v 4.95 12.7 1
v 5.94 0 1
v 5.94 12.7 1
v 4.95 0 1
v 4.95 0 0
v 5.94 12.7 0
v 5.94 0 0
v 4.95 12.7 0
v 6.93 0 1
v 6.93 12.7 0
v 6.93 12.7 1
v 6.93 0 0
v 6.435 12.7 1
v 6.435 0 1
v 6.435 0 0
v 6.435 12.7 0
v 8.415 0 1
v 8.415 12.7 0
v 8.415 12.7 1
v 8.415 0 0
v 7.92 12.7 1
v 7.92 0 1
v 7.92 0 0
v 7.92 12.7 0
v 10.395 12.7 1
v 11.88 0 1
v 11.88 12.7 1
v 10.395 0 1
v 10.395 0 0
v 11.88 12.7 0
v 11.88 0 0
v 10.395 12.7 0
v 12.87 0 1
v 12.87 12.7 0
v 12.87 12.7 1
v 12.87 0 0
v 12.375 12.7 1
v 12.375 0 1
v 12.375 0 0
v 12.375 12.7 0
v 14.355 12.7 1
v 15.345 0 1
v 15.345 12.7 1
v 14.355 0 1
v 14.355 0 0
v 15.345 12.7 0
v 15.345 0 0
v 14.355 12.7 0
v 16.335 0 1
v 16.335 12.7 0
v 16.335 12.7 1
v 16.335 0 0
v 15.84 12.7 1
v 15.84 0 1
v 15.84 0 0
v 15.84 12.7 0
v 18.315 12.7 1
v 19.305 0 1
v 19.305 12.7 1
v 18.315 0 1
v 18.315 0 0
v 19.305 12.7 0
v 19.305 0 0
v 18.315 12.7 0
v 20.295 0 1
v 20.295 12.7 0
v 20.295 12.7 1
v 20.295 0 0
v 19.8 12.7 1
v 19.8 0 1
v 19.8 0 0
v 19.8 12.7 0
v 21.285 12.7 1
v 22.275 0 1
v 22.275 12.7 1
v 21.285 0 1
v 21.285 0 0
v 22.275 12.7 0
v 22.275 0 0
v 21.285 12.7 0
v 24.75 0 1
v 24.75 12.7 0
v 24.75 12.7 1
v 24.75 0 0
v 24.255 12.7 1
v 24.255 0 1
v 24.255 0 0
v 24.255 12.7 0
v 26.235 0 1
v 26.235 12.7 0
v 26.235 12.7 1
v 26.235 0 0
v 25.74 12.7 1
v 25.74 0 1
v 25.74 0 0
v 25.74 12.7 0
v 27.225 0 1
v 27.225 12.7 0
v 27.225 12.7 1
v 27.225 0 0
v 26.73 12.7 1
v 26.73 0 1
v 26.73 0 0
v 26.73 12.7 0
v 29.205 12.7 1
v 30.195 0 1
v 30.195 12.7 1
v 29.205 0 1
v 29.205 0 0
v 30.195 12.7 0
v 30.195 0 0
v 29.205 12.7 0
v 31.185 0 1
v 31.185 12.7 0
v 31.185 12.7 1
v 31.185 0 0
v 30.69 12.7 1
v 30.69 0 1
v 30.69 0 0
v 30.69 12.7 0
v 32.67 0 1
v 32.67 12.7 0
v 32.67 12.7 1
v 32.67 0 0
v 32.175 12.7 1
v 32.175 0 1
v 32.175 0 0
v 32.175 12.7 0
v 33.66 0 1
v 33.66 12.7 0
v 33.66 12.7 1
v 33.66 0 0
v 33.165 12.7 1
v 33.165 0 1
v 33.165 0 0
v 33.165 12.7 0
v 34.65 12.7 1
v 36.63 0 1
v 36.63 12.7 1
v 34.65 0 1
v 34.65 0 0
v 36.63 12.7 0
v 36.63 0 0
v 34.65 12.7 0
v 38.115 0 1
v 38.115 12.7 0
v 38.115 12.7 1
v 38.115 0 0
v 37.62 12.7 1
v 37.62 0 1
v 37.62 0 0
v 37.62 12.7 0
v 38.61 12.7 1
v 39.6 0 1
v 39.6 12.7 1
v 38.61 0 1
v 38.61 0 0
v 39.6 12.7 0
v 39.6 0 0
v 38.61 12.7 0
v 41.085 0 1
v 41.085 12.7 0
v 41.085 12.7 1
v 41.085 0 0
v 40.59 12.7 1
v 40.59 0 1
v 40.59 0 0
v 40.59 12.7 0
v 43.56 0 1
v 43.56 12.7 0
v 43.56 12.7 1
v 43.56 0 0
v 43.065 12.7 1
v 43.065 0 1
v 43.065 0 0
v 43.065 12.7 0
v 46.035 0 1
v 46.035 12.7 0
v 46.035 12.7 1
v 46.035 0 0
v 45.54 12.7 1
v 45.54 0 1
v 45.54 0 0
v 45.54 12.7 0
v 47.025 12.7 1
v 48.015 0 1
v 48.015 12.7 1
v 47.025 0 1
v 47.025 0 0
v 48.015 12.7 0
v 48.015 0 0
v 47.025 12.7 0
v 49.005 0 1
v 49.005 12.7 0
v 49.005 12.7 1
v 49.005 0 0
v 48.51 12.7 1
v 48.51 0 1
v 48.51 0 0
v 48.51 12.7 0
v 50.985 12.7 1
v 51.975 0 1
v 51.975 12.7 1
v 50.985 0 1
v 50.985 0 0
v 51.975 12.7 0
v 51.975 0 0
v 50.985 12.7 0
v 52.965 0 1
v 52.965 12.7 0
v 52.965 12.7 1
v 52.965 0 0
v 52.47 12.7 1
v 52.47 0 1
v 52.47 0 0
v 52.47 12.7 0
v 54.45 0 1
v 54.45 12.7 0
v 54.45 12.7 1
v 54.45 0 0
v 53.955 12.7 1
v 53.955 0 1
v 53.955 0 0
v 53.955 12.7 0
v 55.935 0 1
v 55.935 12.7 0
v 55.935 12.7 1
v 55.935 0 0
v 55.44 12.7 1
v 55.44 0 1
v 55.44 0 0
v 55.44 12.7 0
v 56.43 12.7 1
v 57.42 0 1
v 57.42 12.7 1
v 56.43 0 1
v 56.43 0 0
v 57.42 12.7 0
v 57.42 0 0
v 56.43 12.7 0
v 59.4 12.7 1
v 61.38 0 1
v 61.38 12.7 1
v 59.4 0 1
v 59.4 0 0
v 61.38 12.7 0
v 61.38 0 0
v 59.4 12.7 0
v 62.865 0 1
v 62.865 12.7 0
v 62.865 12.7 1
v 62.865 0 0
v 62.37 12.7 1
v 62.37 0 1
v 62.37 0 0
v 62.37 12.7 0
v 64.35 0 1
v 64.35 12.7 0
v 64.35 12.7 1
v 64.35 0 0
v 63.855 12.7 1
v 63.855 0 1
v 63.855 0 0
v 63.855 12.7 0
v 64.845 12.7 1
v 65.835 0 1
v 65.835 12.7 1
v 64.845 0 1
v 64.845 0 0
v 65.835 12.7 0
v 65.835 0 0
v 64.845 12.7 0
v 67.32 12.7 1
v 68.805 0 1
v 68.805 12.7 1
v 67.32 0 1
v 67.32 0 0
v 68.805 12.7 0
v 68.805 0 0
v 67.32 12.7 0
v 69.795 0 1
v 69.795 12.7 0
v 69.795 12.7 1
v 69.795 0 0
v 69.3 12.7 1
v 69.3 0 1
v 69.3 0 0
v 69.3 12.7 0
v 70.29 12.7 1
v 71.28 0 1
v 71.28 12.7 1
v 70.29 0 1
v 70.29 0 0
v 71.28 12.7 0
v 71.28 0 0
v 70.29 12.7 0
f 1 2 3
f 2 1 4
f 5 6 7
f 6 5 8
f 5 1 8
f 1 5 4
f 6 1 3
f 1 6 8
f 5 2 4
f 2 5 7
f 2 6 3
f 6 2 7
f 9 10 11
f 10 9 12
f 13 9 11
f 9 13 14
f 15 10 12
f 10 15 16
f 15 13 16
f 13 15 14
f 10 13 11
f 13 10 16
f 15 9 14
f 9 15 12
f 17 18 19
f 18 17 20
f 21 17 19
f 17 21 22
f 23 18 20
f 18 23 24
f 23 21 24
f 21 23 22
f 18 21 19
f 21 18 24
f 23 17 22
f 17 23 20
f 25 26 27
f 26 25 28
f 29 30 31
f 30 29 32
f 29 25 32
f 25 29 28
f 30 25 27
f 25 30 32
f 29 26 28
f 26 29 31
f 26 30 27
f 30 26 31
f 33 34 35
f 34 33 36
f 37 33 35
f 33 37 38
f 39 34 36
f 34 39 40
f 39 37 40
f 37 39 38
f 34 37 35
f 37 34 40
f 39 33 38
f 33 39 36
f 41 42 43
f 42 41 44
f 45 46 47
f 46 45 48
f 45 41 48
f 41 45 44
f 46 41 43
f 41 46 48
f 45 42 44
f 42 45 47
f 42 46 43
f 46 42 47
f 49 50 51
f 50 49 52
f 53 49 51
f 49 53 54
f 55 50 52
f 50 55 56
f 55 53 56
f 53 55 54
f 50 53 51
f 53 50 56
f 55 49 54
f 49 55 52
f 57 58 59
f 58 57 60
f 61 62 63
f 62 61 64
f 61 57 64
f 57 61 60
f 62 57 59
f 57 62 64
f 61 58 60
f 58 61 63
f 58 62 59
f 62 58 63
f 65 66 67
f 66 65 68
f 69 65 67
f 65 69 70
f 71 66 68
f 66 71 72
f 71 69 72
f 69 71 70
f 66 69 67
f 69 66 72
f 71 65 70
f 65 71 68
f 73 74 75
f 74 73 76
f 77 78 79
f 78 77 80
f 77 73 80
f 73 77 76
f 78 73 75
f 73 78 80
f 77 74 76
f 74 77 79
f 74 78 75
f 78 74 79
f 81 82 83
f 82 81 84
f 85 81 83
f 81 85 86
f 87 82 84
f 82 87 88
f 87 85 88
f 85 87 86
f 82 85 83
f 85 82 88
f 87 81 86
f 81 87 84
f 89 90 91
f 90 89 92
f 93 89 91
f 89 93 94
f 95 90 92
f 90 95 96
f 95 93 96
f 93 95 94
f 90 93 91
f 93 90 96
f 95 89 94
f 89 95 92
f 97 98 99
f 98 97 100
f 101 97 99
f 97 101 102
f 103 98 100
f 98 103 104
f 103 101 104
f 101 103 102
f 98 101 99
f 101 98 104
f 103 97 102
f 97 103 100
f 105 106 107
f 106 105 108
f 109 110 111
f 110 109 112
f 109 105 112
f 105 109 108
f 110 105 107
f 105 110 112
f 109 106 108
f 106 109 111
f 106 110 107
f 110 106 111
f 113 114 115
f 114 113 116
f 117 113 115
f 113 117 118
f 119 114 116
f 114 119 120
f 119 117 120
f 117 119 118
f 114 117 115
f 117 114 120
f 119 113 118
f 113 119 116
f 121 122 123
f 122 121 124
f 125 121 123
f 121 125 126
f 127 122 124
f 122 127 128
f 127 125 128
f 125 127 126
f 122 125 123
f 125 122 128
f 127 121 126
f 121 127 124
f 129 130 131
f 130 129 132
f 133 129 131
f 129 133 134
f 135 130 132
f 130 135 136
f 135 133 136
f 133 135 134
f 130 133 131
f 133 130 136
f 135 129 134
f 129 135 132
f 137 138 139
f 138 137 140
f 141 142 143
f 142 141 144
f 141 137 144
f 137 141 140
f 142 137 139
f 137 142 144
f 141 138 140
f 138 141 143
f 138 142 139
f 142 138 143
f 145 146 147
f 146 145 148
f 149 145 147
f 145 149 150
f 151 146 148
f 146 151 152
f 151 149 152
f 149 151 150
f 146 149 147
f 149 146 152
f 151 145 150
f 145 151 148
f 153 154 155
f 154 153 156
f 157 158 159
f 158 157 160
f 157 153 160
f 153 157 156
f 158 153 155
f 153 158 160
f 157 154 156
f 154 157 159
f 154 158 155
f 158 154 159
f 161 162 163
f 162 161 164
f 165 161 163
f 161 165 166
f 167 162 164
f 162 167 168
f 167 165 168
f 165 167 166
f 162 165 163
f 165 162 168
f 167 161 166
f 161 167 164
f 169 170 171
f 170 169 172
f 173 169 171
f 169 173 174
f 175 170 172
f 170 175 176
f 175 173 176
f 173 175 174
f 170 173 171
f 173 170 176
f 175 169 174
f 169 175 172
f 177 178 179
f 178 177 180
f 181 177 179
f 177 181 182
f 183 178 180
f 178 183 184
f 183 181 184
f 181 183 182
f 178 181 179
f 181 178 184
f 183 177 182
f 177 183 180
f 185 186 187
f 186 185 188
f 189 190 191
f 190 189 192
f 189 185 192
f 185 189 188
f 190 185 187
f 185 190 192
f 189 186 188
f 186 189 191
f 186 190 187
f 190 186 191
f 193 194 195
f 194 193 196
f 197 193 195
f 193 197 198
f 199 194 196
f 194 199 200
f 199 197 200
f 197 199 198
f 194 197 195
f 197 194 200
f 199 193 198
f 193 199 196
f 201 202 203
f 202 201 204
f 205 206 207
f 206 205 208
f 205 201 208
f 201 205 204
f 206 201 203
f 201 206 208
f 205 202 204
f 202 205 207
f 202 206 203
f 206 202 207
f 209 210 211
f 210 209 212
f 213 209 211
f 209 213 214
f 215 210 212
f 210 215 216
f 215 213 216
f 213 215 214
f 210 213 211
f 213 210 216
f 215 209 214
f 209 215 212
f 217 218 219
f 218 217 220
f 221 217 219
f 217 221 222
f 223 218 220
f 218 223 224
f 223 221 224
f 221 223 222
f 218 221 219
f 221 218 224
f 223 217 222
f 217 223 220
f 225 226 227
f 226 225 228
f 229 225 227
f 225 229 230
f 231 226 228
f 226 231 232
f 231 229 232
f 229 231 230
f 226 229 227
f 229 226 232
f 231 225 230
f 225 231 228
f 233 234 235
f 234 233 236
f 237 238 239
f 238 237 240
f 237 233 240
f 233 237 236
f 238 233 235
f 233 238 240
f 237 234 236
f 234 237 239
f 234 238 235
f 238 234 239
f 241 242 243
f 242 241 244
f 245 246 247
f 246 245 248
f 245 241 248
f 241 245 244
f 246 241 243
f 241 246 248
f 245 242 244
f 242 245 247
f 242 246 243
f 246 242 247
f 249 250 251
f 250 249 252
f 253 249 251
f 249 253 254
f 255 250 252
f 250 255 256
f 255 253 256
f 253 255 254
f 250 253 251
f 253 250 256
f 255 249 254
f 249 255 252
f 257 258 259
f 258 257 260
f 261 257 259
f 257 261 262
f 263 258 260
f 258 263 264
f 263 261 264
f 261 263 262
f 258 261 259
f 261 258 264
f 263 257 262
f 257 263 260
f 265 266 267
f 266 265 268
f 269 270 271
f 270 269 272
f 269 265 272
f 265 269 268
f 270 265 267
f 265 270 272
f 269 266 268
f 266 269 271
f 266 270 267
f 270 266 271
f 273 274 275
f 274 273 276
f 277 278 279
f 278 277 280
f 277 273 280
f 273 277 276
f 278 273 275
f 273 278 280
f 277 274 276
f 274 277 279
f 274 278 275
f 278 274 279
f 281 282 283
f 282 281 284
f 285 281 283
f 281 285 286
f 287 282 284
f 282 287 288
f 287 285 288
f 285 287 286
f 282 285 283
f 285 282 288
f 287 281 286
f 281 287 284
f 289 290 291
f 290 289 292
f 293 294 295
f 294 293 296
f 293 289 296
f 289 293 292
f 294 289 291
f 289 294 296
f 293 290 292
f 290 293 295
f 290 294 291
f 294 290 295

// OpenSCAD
// file: ../../util/bitmap.scad
/*****************************************************************************
 * Module Bitmap Library
 * Modules to create bitmaps of unit squares from 1 or 2 dimensional vectors.
 *****************************************************************************
 * Copyright 2017 Chris Baker
 *
 * This program is free software: you can redistribute it and/or modify
 * it under the terms of the GNU Lesser General Public License as published by
 * the Free Software Foundation, either version 3 of the License, or
 * (at your option) any later version.
 *
 * This program is distributed in the hope that it will be useful,
 * but WITHOUT ANY WARRANTY; without even the implied warranty of
 * MERCHANTABILITY or FITNESS FOR A PARTICULAR PURPOSE.  See the
 * GNU Lesser General Public License for more details.
 *
 * You should have received a copy of the GNU Lesser General Public License
 * along with this program.  If not, see <http://www.gnu.org/licenses/>.
 *****************************************************************************
 * Usage:
 * Include this file with the "use" tag.
 * Depends on compat.scad library.
 *
 * API:
 *   1dbitmap(bitmap, center, expansion, vector_mode)
 *   2dbitmap(bitmap, center, expansion, vector_mode)
 *     Generate a 1 or 2-Dimensional field of modules based on the provided
 *     bitmap vector. See Bitmap Vectors below.
 *     The center flag determines whether to center the bitmap on the origin.
 *     The expansion value actually shrinks each cube in the x and y
 *     dimension by the specified amount.
 *     The vector_mode flag determines whether to create 3D solid geometry
 *     (unit cubes) or 2D vector geometry (squares).
 *
 * Bitmap Vectors:
 *   The bitmap vectors primarily provide boolean information.
 *   A module will be placed where these vectors have a postive value and
 *   skipped where they have a negative value. I.E. 0, -1, false, and undef
 *   are all equivalent and result in a skip. 1 and true are equivalent and
 *   result in a placed 1-unit module.
 *   Further, if the value is an integer it will be treated as a height for
 *   the module, allowing z-maps to be created.
 *   If the value is not an integer or boolean, it will be treated as a color
 *   reference. This can be a string or RGBA vector that will be used to
 *   color the module in the OpenSCAD preview window.
 *   In current versions of OpenSCAD, the color has no effect in the rendered
 *   view or STL output.
 *
 * Vector Mode:
 *   Although OpenSCAD supports generating 2D geometry, there are several
 *   caveats:
 *   - 2D and 3D geometry cannot be mixed
 *   - Extruding 2D geometry causes color information to be lost
 *   - All 2D geometry is projected onto the XY plane when rendering
 *   - Rendering also results in loss of color (same as 3D)
 *   - The SVG exporter is somewhat limited:
 *     - The pixel size of the image is hard-coded in the file
 *     - The title of the image is a generic string
 *     - The color selection for stroke and fill is fixed
 *     - The stroke-width is set to a large value that will cause overlap
 *     - The background is transparent
 *     - Only one path element is created with all of the geometry; there is
 *       no easy way to split up the geometry into multiple logical units.
 *     - These issues can mostly be resolved by hand-editing the file:
 *       - Remove or modify the width and height parameters from the svg
 *         element at the top of the file to provide better scaling.
 *       - Edit the title element at the top of the file to change the title.
 *       - Edit the stroke and fill parameters of the path element (these will
 *         probably be at the end of the file).
 *       - Set the stroke-width parameter for the path element to 0.
 *****************************************************************************/
use <compat.scad>

/*
 * 2dbitmap - Turn a 2D vector into a bitmap of cubes
 *
 * bitmap - 2D vector representing where to place each cube
 *          Value can either be boolean, z-height, or color
 * center - center cubes around the origin
 * expansion - size of gap around each pixel (screendoor)
 * vector_mode - create a 2D vector drawing instead of 3D extrusion
 */
module 2dbitmap(bitmap=[[1,0],[0,1]], center=false, expansion=0, vector_mode=false)
{
	ylen=len(bitmap)-1;

	for (y=[0:ylen]) {
		xlen=len(bitmap[y])-1;
		for (x=[0:xlen])
			translate([x-(center?xlen/2:0),ylen-y-(center?ylen/2:0),0])
				if (is_indexable(bitmap[y][x]))
					color(bitmap[y][x])
						if (vector_mode)
							square([1-expansion,1-expansion], center=center);
						else
							cube([1-expansion,1-expansion,1], center=center);
				else
					if (bitmap[y][x])
						if (vector_mode)
							square([1-expansion,1-expansion], center=center);
						else
							cube([1-expansion,1-expansion,clamp_nonnum(bitmap[y][x])], center=center);
	}
}

module 1dbitmap(bitmap=[1,0,1,0,1], center=false, expansion=0, vector_mode=false)
	2dbitmap([bitmap], center, expansion, vector_mode);

/*
 * Examples
 */

// 1D with z-height
translate([10,0,0]) scale([1,10,1])
	1dbitmap(bitmap=[1,1,0,2,0,0,3], expansion=.1);

// 1D with boolean
translate([-20,0,0]) scale([1,10,1])
	1dbitmap(bitmap=[true,false,true,false,true,true]);

// 2D with z-height
scale([2,2,1])
	2dbitmap(bitmap=[[1,0,2,1],[0,3,3,0],[1,1,0,1]],
		center=true);

// 1D with color
translate([0,-10,0]) scale([1,3,1])
	1dbitmap(bitmap=["red","white","blue",[0,0.3,0,0.5]]);

// 1D with color using 2D-vector-mode
translate([-7,-8,0]) scale([1,2])
	1dbitmap(bitmap=["red",0,"blue",0,"green"], vector_mode=true);
translate([-4.5,-10,0]) scale([1,2])
	1dbitmap(bitmap=["red",0,"blue",0,"green"], vector_mode=true, center=true);
// main file
/* Unit Test 09: bar=[.2,.5,.8] */
use <../code128.scad>

code_128(cs128_b("Wikipedia"), bar=[.2,.5,.8]);
